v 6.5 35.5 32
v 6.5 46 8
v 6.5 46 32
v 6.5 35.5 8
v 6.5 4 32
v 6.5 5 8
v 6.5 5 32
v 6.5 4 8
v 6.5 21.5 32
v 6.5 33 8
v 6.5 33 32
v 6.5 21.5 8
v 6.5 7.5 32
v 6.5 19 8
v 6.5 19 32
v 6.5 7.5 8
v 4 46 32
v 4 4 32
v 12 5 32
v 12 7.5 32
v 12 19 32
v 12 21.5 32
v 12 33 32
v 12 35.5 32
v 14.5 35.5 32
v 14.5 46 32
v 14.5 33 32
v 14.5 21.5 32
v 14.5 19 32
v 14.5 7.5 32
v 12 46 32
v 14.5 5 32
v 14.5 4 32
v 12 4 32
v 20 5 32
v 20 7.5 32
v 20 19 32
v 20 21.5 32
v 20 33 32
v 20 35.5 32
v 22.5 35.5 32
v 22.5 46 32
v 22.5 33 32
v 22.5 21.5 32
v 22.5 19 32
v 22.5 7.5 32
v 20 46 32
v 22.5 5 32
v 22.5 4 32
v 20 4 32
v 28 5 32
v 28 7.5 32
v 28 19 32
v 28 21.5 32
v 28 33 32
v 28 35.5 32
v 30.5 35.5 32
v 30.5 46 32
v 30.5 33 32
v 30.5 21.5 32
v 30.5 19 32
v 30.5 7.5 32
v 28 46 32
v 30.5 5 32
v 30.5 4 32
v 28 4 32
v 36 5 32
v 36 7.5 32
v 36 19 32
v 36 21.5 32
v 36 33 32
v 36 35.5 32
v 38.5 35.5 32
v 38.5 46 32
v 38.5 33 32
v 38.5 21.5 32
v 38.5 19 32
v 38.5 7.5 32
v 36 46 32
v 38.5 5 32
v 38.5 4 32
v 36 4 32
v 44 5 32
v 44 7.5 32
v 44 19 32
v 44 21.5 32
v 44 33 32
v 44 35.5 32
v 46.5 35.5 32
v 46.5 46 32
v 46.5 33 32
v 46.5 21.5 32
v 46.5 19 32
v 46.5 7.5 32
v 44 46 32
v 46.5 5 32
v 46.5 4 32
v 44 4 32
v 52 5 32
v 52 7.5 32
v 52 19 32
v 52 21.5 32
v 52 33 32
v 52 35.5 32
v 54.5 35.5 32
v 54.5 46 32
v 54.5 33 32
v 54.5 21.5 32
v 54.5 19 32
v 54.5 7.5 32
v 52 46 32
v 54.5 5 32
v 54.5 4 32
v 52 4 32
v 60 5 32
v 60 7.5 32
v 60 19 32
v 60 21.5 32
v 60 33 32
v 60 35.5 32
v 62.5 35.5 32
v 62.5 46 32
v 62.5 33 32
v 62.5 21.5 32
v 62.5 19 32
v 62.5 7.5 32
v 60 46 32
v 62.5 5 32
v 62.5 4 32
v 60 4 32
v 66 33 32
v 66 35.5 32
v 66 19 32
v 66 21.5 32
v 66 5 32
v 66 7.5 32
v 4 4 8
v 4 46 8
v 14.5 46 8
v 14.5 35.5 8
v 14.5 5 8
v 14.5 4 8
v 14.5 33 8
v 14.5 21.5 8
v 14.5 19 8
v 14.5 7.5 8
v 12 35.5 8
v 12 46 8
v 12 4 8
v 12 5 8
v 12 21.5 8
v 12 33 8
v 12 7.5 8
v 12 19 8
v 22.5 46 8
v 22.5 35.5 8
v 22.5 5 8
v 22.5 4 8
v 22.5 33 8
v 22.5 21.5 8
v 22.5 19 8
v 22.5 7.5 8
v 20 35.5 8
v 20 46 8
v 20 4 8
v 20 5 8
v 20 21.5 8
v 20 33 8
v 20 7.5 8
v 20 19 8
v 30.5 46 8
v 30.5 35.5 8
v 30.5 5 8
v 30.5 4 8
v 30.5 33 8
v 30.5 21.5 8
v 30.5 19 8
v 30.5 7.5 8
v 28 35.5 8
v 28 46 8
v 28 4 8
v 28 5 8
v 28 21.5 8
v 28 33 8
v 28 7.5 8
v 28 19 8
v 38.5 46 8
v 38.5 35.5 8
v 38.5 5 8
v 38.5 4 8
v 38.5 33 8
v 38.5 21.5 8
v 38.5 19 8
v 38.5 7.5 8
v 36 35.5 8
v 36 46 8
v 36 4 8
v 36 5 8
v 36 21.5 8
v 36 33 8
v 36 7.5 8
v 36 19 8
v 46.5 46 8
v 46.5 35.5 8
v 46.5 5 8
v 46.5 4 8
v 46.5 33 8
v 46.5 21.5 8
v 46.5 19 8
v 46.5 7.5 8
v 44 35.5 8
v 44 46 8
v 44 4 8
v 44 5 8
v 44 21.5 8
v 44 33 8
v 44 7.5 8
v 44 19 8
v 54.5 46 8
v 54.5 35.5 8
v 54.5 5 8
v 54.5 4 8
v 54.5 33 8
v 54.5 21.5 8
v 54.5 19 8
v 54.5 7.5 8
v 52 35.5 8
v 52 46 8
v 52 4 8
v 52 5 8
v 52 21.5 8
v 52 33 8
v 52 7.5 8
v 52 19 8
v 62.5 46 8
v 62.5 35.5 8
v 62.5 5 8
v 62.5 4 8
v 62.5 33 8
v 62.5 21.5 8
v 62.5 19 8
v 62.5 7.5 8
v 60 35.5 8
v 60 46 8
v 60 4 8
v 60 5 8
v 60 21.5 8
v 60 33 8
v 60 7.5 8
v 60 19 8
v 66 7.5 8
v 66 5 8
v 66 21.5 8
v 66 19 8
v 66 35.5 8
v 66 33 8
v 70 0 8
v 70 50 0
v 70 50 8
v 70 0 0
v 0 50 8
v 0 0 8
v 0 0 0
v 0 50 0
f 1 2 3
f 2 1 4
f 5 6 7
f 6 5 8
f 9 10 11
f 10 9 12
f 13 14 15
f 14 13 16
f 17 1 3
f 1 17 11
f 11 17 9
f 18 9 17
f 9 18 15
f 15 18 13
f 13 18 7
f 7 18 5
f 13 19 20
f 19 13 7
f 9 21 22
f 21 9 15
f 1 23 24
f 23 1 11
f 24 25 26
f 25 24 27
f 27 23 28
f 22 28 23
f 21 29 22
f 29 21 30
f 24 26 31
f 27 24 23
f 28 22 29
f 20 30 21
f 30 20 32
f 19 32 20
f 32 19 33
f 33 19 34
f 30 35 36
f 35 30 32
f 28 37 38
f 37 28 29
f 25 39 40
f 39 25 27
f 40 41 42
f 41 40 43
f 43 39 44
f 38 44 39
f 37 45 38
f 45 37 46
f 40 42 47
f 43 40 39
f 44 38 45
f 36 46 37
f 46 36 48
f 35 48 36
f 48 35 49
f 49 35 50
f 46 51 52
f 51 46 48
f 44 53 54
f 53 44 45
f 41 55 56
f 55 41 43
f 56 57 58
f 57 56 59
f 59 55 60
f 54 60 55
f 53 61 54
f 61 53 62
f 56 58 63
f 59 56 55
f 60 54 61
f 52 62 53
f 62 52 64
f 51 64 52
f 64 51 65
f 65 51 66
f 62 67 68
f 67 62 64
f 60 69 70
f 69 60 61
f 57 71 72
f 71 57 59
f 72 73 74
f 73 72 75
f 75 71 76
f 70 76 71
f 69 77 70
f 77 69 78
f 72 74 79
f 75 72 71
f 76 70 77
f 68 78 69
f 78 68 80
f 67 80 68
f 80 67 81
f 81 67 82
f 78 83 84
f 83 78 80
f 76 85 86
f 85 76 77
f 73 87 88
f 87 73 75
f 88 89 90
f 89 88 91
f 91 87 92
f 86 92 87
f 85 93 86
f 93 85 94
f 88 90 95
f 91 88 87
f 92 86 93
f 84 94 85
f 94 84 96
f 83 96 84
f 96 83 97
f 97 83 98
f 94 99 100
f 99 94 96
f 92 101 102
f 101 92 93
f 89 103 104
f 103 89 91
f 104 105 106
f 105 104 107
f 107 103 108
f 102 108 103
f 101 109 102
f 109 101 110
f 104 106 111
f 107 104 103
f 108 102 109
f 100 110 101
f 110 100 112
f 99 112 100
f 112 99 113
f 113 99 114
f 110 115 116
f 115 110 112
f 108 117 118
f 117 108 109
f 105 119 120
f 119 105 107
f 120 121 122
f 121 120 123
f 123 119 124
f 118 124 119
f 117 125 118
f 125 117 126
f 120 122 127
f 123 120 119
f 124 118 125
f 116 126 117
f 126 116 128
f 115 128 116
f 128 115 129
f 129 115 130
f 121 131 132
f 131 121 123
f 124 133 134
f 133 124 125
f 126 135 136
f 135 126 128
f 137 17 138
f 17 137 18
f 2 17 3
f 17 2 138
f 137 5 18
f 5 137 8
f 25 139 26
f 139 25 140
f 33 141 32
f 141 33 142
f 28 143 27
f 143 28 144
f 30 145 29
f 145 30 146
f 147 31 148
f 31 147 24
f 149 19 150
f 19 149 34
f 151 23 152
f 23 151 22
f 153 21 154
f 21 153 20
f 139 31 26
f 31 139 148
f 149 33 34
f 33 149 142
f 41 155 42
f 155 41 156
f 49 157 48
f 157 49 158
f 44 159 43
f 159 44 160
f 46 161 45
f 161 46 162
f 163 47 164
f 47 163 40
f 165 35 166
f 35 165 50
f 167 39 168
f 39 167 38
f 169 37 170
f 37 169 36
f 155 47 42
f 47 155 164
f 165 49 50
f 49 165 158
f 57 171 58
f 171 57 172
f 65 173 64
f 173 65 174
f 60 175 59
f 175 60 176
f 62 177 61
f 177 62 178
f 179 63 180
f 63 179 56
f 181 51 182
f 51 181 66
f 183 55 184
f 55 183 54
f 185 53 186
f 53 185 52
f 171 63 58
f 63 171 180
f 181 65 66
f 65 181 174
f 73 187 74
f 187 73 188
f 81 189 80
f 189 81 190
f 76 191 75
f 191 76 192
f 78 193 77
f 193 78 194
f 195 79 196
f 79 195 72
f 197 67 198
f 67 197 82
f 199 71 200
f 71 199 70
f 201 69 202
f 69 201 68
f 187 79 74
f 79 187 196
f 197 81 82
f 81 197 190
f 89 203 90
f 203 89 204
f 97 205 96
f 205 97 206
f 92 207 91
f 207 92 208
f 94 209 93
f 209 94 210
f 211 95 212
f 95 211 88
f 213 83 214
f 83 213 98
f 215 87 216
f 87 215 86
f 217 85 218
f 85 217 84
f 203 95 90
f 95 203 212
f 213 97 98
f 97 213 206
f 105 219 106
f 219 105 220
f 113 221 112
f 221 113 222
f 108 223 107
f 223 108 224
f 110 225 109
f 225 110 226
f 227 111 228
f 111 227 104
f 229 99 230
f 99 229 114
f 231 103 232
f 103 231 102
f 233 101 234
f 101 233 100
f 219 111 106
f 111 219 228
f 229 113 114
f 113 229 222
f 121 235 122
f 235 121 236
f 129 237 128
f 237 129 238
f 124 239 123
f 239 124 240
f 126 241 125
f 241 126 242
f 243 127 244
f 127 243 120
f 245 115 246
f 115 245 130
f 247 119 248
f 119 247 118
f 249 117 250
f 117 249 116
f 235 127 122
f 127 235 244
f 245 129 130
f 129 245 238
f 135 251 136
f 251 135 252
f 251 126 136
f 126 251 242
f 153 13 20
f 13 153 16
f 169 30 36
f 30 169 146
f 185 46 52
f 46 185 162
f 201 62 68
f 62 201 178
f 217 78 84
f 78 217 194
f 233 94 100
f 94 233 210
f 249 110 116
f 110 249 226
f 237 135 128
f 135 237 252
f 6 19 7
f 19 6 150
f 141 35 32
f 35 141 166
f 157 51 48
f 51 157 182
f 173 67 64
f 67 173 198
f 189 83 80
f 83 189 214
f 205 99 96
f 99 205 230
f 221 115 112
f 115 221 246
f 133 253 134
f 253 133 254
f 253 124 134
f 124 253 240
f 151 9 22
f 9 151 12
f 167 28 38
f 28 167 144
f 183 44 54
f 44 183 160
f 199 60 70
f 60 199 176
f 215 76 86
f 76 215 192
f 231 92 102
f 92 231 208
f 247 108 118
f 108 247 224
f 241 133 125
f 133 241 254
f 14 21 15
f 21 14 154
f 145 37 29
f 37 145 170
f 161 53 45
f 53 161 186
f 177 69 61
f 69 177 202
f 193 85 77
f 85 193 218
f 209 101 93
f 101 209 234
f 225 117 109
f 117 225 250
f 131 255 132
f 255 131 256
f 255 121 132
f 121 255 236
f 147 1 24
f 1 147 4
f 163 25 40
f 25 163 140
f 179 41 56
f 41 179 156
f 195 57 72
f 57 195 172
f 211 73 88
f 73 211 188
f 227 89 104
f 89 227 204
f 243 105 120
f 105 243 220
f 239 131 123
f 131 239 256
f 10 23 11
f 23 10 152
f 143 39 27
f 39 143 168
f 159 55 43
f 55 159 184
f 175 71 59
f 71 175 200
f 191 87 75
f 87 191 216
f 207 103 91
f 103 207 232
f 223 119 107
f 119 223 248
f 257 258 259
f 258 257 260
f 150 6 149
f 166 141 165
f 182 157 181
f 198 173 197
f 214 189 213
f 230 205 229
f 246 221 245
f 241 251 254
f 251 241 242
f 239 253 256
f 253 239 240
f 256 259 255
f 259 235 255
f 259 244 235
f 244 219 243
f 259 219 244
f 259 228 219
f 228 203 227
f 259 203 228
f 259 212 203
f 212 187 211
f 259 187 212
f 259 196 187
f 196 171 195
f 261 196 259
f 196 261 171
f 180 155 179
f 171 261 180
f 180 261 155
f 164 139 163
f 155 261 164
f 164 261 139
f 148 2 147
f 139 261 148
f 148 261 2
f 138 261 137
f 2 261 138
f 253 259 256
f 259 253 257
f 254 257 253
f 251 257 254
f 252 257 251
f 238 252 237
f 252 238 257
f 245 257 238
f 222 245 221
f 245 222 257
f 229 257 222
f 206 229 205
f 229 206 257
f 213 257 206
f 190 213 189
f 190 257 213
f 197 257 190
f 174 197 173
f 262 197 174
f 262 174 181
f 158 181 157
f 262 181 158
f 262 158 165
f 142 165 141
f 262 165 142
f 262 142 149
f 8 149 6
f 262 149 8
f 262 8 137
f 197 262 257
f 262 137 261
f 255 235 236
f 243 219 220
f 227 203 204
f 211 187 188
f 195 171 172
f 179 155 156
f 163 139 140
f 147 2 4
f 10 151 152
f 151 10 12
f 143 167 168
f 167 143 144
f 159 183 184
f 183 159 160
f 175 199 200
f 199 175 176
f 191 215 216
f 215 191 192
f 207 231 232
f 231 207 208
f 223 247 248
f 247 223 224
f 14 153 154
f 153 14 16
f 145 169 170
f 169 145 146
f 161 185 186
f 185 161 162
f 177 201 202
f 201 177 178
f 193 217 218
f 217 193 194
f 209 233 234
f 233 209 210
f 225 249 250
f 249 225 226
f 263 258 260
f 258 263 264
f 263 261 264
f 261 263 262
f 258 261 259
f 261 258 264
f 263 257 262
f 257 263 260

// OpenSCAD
$fn = 32;

// ----------------------------------------------------------------------
// Heatsink: cross fin block
// ----------------------------------------------------------------------

// --- parameters (mm) ---
base_l = 70;              // base length, X
base_w = 50;              // base width, Y
base_t = 8;               // base plate thickness
fin_h = 25;               // fin height above the base
fin_t = 2.5;              // fin thickness
edge = 4;                 // margin from the base ends
pitch = 8;                // fin pitch
rib_pitch = 14;           // cross rib pitch

n_fins = floor((base_l - 2 * edge - fin_t) / pitch) + 1;  // fin count
total_h = base_t + fin_h - 1;  // overall height
n_ribs = floor((base_w - 2 * edge) / rib_pitch);  // rib count

union() {
  cube([base_l, base_w, base_t]);
  for (i = [0 : n_fins - 1])
    translate([edge + i * pitch, edge, base_t - 1])
      cube([fin_t, base_w - 2 * edge, fin_h]);
  for (i = [0 : n_ribs - 1])
    translate([edge, edge + 1 + i * rib_pitch, base_t - 1])
      cube([base_l - 2 * edge, fin_t, fin_h]);
}
